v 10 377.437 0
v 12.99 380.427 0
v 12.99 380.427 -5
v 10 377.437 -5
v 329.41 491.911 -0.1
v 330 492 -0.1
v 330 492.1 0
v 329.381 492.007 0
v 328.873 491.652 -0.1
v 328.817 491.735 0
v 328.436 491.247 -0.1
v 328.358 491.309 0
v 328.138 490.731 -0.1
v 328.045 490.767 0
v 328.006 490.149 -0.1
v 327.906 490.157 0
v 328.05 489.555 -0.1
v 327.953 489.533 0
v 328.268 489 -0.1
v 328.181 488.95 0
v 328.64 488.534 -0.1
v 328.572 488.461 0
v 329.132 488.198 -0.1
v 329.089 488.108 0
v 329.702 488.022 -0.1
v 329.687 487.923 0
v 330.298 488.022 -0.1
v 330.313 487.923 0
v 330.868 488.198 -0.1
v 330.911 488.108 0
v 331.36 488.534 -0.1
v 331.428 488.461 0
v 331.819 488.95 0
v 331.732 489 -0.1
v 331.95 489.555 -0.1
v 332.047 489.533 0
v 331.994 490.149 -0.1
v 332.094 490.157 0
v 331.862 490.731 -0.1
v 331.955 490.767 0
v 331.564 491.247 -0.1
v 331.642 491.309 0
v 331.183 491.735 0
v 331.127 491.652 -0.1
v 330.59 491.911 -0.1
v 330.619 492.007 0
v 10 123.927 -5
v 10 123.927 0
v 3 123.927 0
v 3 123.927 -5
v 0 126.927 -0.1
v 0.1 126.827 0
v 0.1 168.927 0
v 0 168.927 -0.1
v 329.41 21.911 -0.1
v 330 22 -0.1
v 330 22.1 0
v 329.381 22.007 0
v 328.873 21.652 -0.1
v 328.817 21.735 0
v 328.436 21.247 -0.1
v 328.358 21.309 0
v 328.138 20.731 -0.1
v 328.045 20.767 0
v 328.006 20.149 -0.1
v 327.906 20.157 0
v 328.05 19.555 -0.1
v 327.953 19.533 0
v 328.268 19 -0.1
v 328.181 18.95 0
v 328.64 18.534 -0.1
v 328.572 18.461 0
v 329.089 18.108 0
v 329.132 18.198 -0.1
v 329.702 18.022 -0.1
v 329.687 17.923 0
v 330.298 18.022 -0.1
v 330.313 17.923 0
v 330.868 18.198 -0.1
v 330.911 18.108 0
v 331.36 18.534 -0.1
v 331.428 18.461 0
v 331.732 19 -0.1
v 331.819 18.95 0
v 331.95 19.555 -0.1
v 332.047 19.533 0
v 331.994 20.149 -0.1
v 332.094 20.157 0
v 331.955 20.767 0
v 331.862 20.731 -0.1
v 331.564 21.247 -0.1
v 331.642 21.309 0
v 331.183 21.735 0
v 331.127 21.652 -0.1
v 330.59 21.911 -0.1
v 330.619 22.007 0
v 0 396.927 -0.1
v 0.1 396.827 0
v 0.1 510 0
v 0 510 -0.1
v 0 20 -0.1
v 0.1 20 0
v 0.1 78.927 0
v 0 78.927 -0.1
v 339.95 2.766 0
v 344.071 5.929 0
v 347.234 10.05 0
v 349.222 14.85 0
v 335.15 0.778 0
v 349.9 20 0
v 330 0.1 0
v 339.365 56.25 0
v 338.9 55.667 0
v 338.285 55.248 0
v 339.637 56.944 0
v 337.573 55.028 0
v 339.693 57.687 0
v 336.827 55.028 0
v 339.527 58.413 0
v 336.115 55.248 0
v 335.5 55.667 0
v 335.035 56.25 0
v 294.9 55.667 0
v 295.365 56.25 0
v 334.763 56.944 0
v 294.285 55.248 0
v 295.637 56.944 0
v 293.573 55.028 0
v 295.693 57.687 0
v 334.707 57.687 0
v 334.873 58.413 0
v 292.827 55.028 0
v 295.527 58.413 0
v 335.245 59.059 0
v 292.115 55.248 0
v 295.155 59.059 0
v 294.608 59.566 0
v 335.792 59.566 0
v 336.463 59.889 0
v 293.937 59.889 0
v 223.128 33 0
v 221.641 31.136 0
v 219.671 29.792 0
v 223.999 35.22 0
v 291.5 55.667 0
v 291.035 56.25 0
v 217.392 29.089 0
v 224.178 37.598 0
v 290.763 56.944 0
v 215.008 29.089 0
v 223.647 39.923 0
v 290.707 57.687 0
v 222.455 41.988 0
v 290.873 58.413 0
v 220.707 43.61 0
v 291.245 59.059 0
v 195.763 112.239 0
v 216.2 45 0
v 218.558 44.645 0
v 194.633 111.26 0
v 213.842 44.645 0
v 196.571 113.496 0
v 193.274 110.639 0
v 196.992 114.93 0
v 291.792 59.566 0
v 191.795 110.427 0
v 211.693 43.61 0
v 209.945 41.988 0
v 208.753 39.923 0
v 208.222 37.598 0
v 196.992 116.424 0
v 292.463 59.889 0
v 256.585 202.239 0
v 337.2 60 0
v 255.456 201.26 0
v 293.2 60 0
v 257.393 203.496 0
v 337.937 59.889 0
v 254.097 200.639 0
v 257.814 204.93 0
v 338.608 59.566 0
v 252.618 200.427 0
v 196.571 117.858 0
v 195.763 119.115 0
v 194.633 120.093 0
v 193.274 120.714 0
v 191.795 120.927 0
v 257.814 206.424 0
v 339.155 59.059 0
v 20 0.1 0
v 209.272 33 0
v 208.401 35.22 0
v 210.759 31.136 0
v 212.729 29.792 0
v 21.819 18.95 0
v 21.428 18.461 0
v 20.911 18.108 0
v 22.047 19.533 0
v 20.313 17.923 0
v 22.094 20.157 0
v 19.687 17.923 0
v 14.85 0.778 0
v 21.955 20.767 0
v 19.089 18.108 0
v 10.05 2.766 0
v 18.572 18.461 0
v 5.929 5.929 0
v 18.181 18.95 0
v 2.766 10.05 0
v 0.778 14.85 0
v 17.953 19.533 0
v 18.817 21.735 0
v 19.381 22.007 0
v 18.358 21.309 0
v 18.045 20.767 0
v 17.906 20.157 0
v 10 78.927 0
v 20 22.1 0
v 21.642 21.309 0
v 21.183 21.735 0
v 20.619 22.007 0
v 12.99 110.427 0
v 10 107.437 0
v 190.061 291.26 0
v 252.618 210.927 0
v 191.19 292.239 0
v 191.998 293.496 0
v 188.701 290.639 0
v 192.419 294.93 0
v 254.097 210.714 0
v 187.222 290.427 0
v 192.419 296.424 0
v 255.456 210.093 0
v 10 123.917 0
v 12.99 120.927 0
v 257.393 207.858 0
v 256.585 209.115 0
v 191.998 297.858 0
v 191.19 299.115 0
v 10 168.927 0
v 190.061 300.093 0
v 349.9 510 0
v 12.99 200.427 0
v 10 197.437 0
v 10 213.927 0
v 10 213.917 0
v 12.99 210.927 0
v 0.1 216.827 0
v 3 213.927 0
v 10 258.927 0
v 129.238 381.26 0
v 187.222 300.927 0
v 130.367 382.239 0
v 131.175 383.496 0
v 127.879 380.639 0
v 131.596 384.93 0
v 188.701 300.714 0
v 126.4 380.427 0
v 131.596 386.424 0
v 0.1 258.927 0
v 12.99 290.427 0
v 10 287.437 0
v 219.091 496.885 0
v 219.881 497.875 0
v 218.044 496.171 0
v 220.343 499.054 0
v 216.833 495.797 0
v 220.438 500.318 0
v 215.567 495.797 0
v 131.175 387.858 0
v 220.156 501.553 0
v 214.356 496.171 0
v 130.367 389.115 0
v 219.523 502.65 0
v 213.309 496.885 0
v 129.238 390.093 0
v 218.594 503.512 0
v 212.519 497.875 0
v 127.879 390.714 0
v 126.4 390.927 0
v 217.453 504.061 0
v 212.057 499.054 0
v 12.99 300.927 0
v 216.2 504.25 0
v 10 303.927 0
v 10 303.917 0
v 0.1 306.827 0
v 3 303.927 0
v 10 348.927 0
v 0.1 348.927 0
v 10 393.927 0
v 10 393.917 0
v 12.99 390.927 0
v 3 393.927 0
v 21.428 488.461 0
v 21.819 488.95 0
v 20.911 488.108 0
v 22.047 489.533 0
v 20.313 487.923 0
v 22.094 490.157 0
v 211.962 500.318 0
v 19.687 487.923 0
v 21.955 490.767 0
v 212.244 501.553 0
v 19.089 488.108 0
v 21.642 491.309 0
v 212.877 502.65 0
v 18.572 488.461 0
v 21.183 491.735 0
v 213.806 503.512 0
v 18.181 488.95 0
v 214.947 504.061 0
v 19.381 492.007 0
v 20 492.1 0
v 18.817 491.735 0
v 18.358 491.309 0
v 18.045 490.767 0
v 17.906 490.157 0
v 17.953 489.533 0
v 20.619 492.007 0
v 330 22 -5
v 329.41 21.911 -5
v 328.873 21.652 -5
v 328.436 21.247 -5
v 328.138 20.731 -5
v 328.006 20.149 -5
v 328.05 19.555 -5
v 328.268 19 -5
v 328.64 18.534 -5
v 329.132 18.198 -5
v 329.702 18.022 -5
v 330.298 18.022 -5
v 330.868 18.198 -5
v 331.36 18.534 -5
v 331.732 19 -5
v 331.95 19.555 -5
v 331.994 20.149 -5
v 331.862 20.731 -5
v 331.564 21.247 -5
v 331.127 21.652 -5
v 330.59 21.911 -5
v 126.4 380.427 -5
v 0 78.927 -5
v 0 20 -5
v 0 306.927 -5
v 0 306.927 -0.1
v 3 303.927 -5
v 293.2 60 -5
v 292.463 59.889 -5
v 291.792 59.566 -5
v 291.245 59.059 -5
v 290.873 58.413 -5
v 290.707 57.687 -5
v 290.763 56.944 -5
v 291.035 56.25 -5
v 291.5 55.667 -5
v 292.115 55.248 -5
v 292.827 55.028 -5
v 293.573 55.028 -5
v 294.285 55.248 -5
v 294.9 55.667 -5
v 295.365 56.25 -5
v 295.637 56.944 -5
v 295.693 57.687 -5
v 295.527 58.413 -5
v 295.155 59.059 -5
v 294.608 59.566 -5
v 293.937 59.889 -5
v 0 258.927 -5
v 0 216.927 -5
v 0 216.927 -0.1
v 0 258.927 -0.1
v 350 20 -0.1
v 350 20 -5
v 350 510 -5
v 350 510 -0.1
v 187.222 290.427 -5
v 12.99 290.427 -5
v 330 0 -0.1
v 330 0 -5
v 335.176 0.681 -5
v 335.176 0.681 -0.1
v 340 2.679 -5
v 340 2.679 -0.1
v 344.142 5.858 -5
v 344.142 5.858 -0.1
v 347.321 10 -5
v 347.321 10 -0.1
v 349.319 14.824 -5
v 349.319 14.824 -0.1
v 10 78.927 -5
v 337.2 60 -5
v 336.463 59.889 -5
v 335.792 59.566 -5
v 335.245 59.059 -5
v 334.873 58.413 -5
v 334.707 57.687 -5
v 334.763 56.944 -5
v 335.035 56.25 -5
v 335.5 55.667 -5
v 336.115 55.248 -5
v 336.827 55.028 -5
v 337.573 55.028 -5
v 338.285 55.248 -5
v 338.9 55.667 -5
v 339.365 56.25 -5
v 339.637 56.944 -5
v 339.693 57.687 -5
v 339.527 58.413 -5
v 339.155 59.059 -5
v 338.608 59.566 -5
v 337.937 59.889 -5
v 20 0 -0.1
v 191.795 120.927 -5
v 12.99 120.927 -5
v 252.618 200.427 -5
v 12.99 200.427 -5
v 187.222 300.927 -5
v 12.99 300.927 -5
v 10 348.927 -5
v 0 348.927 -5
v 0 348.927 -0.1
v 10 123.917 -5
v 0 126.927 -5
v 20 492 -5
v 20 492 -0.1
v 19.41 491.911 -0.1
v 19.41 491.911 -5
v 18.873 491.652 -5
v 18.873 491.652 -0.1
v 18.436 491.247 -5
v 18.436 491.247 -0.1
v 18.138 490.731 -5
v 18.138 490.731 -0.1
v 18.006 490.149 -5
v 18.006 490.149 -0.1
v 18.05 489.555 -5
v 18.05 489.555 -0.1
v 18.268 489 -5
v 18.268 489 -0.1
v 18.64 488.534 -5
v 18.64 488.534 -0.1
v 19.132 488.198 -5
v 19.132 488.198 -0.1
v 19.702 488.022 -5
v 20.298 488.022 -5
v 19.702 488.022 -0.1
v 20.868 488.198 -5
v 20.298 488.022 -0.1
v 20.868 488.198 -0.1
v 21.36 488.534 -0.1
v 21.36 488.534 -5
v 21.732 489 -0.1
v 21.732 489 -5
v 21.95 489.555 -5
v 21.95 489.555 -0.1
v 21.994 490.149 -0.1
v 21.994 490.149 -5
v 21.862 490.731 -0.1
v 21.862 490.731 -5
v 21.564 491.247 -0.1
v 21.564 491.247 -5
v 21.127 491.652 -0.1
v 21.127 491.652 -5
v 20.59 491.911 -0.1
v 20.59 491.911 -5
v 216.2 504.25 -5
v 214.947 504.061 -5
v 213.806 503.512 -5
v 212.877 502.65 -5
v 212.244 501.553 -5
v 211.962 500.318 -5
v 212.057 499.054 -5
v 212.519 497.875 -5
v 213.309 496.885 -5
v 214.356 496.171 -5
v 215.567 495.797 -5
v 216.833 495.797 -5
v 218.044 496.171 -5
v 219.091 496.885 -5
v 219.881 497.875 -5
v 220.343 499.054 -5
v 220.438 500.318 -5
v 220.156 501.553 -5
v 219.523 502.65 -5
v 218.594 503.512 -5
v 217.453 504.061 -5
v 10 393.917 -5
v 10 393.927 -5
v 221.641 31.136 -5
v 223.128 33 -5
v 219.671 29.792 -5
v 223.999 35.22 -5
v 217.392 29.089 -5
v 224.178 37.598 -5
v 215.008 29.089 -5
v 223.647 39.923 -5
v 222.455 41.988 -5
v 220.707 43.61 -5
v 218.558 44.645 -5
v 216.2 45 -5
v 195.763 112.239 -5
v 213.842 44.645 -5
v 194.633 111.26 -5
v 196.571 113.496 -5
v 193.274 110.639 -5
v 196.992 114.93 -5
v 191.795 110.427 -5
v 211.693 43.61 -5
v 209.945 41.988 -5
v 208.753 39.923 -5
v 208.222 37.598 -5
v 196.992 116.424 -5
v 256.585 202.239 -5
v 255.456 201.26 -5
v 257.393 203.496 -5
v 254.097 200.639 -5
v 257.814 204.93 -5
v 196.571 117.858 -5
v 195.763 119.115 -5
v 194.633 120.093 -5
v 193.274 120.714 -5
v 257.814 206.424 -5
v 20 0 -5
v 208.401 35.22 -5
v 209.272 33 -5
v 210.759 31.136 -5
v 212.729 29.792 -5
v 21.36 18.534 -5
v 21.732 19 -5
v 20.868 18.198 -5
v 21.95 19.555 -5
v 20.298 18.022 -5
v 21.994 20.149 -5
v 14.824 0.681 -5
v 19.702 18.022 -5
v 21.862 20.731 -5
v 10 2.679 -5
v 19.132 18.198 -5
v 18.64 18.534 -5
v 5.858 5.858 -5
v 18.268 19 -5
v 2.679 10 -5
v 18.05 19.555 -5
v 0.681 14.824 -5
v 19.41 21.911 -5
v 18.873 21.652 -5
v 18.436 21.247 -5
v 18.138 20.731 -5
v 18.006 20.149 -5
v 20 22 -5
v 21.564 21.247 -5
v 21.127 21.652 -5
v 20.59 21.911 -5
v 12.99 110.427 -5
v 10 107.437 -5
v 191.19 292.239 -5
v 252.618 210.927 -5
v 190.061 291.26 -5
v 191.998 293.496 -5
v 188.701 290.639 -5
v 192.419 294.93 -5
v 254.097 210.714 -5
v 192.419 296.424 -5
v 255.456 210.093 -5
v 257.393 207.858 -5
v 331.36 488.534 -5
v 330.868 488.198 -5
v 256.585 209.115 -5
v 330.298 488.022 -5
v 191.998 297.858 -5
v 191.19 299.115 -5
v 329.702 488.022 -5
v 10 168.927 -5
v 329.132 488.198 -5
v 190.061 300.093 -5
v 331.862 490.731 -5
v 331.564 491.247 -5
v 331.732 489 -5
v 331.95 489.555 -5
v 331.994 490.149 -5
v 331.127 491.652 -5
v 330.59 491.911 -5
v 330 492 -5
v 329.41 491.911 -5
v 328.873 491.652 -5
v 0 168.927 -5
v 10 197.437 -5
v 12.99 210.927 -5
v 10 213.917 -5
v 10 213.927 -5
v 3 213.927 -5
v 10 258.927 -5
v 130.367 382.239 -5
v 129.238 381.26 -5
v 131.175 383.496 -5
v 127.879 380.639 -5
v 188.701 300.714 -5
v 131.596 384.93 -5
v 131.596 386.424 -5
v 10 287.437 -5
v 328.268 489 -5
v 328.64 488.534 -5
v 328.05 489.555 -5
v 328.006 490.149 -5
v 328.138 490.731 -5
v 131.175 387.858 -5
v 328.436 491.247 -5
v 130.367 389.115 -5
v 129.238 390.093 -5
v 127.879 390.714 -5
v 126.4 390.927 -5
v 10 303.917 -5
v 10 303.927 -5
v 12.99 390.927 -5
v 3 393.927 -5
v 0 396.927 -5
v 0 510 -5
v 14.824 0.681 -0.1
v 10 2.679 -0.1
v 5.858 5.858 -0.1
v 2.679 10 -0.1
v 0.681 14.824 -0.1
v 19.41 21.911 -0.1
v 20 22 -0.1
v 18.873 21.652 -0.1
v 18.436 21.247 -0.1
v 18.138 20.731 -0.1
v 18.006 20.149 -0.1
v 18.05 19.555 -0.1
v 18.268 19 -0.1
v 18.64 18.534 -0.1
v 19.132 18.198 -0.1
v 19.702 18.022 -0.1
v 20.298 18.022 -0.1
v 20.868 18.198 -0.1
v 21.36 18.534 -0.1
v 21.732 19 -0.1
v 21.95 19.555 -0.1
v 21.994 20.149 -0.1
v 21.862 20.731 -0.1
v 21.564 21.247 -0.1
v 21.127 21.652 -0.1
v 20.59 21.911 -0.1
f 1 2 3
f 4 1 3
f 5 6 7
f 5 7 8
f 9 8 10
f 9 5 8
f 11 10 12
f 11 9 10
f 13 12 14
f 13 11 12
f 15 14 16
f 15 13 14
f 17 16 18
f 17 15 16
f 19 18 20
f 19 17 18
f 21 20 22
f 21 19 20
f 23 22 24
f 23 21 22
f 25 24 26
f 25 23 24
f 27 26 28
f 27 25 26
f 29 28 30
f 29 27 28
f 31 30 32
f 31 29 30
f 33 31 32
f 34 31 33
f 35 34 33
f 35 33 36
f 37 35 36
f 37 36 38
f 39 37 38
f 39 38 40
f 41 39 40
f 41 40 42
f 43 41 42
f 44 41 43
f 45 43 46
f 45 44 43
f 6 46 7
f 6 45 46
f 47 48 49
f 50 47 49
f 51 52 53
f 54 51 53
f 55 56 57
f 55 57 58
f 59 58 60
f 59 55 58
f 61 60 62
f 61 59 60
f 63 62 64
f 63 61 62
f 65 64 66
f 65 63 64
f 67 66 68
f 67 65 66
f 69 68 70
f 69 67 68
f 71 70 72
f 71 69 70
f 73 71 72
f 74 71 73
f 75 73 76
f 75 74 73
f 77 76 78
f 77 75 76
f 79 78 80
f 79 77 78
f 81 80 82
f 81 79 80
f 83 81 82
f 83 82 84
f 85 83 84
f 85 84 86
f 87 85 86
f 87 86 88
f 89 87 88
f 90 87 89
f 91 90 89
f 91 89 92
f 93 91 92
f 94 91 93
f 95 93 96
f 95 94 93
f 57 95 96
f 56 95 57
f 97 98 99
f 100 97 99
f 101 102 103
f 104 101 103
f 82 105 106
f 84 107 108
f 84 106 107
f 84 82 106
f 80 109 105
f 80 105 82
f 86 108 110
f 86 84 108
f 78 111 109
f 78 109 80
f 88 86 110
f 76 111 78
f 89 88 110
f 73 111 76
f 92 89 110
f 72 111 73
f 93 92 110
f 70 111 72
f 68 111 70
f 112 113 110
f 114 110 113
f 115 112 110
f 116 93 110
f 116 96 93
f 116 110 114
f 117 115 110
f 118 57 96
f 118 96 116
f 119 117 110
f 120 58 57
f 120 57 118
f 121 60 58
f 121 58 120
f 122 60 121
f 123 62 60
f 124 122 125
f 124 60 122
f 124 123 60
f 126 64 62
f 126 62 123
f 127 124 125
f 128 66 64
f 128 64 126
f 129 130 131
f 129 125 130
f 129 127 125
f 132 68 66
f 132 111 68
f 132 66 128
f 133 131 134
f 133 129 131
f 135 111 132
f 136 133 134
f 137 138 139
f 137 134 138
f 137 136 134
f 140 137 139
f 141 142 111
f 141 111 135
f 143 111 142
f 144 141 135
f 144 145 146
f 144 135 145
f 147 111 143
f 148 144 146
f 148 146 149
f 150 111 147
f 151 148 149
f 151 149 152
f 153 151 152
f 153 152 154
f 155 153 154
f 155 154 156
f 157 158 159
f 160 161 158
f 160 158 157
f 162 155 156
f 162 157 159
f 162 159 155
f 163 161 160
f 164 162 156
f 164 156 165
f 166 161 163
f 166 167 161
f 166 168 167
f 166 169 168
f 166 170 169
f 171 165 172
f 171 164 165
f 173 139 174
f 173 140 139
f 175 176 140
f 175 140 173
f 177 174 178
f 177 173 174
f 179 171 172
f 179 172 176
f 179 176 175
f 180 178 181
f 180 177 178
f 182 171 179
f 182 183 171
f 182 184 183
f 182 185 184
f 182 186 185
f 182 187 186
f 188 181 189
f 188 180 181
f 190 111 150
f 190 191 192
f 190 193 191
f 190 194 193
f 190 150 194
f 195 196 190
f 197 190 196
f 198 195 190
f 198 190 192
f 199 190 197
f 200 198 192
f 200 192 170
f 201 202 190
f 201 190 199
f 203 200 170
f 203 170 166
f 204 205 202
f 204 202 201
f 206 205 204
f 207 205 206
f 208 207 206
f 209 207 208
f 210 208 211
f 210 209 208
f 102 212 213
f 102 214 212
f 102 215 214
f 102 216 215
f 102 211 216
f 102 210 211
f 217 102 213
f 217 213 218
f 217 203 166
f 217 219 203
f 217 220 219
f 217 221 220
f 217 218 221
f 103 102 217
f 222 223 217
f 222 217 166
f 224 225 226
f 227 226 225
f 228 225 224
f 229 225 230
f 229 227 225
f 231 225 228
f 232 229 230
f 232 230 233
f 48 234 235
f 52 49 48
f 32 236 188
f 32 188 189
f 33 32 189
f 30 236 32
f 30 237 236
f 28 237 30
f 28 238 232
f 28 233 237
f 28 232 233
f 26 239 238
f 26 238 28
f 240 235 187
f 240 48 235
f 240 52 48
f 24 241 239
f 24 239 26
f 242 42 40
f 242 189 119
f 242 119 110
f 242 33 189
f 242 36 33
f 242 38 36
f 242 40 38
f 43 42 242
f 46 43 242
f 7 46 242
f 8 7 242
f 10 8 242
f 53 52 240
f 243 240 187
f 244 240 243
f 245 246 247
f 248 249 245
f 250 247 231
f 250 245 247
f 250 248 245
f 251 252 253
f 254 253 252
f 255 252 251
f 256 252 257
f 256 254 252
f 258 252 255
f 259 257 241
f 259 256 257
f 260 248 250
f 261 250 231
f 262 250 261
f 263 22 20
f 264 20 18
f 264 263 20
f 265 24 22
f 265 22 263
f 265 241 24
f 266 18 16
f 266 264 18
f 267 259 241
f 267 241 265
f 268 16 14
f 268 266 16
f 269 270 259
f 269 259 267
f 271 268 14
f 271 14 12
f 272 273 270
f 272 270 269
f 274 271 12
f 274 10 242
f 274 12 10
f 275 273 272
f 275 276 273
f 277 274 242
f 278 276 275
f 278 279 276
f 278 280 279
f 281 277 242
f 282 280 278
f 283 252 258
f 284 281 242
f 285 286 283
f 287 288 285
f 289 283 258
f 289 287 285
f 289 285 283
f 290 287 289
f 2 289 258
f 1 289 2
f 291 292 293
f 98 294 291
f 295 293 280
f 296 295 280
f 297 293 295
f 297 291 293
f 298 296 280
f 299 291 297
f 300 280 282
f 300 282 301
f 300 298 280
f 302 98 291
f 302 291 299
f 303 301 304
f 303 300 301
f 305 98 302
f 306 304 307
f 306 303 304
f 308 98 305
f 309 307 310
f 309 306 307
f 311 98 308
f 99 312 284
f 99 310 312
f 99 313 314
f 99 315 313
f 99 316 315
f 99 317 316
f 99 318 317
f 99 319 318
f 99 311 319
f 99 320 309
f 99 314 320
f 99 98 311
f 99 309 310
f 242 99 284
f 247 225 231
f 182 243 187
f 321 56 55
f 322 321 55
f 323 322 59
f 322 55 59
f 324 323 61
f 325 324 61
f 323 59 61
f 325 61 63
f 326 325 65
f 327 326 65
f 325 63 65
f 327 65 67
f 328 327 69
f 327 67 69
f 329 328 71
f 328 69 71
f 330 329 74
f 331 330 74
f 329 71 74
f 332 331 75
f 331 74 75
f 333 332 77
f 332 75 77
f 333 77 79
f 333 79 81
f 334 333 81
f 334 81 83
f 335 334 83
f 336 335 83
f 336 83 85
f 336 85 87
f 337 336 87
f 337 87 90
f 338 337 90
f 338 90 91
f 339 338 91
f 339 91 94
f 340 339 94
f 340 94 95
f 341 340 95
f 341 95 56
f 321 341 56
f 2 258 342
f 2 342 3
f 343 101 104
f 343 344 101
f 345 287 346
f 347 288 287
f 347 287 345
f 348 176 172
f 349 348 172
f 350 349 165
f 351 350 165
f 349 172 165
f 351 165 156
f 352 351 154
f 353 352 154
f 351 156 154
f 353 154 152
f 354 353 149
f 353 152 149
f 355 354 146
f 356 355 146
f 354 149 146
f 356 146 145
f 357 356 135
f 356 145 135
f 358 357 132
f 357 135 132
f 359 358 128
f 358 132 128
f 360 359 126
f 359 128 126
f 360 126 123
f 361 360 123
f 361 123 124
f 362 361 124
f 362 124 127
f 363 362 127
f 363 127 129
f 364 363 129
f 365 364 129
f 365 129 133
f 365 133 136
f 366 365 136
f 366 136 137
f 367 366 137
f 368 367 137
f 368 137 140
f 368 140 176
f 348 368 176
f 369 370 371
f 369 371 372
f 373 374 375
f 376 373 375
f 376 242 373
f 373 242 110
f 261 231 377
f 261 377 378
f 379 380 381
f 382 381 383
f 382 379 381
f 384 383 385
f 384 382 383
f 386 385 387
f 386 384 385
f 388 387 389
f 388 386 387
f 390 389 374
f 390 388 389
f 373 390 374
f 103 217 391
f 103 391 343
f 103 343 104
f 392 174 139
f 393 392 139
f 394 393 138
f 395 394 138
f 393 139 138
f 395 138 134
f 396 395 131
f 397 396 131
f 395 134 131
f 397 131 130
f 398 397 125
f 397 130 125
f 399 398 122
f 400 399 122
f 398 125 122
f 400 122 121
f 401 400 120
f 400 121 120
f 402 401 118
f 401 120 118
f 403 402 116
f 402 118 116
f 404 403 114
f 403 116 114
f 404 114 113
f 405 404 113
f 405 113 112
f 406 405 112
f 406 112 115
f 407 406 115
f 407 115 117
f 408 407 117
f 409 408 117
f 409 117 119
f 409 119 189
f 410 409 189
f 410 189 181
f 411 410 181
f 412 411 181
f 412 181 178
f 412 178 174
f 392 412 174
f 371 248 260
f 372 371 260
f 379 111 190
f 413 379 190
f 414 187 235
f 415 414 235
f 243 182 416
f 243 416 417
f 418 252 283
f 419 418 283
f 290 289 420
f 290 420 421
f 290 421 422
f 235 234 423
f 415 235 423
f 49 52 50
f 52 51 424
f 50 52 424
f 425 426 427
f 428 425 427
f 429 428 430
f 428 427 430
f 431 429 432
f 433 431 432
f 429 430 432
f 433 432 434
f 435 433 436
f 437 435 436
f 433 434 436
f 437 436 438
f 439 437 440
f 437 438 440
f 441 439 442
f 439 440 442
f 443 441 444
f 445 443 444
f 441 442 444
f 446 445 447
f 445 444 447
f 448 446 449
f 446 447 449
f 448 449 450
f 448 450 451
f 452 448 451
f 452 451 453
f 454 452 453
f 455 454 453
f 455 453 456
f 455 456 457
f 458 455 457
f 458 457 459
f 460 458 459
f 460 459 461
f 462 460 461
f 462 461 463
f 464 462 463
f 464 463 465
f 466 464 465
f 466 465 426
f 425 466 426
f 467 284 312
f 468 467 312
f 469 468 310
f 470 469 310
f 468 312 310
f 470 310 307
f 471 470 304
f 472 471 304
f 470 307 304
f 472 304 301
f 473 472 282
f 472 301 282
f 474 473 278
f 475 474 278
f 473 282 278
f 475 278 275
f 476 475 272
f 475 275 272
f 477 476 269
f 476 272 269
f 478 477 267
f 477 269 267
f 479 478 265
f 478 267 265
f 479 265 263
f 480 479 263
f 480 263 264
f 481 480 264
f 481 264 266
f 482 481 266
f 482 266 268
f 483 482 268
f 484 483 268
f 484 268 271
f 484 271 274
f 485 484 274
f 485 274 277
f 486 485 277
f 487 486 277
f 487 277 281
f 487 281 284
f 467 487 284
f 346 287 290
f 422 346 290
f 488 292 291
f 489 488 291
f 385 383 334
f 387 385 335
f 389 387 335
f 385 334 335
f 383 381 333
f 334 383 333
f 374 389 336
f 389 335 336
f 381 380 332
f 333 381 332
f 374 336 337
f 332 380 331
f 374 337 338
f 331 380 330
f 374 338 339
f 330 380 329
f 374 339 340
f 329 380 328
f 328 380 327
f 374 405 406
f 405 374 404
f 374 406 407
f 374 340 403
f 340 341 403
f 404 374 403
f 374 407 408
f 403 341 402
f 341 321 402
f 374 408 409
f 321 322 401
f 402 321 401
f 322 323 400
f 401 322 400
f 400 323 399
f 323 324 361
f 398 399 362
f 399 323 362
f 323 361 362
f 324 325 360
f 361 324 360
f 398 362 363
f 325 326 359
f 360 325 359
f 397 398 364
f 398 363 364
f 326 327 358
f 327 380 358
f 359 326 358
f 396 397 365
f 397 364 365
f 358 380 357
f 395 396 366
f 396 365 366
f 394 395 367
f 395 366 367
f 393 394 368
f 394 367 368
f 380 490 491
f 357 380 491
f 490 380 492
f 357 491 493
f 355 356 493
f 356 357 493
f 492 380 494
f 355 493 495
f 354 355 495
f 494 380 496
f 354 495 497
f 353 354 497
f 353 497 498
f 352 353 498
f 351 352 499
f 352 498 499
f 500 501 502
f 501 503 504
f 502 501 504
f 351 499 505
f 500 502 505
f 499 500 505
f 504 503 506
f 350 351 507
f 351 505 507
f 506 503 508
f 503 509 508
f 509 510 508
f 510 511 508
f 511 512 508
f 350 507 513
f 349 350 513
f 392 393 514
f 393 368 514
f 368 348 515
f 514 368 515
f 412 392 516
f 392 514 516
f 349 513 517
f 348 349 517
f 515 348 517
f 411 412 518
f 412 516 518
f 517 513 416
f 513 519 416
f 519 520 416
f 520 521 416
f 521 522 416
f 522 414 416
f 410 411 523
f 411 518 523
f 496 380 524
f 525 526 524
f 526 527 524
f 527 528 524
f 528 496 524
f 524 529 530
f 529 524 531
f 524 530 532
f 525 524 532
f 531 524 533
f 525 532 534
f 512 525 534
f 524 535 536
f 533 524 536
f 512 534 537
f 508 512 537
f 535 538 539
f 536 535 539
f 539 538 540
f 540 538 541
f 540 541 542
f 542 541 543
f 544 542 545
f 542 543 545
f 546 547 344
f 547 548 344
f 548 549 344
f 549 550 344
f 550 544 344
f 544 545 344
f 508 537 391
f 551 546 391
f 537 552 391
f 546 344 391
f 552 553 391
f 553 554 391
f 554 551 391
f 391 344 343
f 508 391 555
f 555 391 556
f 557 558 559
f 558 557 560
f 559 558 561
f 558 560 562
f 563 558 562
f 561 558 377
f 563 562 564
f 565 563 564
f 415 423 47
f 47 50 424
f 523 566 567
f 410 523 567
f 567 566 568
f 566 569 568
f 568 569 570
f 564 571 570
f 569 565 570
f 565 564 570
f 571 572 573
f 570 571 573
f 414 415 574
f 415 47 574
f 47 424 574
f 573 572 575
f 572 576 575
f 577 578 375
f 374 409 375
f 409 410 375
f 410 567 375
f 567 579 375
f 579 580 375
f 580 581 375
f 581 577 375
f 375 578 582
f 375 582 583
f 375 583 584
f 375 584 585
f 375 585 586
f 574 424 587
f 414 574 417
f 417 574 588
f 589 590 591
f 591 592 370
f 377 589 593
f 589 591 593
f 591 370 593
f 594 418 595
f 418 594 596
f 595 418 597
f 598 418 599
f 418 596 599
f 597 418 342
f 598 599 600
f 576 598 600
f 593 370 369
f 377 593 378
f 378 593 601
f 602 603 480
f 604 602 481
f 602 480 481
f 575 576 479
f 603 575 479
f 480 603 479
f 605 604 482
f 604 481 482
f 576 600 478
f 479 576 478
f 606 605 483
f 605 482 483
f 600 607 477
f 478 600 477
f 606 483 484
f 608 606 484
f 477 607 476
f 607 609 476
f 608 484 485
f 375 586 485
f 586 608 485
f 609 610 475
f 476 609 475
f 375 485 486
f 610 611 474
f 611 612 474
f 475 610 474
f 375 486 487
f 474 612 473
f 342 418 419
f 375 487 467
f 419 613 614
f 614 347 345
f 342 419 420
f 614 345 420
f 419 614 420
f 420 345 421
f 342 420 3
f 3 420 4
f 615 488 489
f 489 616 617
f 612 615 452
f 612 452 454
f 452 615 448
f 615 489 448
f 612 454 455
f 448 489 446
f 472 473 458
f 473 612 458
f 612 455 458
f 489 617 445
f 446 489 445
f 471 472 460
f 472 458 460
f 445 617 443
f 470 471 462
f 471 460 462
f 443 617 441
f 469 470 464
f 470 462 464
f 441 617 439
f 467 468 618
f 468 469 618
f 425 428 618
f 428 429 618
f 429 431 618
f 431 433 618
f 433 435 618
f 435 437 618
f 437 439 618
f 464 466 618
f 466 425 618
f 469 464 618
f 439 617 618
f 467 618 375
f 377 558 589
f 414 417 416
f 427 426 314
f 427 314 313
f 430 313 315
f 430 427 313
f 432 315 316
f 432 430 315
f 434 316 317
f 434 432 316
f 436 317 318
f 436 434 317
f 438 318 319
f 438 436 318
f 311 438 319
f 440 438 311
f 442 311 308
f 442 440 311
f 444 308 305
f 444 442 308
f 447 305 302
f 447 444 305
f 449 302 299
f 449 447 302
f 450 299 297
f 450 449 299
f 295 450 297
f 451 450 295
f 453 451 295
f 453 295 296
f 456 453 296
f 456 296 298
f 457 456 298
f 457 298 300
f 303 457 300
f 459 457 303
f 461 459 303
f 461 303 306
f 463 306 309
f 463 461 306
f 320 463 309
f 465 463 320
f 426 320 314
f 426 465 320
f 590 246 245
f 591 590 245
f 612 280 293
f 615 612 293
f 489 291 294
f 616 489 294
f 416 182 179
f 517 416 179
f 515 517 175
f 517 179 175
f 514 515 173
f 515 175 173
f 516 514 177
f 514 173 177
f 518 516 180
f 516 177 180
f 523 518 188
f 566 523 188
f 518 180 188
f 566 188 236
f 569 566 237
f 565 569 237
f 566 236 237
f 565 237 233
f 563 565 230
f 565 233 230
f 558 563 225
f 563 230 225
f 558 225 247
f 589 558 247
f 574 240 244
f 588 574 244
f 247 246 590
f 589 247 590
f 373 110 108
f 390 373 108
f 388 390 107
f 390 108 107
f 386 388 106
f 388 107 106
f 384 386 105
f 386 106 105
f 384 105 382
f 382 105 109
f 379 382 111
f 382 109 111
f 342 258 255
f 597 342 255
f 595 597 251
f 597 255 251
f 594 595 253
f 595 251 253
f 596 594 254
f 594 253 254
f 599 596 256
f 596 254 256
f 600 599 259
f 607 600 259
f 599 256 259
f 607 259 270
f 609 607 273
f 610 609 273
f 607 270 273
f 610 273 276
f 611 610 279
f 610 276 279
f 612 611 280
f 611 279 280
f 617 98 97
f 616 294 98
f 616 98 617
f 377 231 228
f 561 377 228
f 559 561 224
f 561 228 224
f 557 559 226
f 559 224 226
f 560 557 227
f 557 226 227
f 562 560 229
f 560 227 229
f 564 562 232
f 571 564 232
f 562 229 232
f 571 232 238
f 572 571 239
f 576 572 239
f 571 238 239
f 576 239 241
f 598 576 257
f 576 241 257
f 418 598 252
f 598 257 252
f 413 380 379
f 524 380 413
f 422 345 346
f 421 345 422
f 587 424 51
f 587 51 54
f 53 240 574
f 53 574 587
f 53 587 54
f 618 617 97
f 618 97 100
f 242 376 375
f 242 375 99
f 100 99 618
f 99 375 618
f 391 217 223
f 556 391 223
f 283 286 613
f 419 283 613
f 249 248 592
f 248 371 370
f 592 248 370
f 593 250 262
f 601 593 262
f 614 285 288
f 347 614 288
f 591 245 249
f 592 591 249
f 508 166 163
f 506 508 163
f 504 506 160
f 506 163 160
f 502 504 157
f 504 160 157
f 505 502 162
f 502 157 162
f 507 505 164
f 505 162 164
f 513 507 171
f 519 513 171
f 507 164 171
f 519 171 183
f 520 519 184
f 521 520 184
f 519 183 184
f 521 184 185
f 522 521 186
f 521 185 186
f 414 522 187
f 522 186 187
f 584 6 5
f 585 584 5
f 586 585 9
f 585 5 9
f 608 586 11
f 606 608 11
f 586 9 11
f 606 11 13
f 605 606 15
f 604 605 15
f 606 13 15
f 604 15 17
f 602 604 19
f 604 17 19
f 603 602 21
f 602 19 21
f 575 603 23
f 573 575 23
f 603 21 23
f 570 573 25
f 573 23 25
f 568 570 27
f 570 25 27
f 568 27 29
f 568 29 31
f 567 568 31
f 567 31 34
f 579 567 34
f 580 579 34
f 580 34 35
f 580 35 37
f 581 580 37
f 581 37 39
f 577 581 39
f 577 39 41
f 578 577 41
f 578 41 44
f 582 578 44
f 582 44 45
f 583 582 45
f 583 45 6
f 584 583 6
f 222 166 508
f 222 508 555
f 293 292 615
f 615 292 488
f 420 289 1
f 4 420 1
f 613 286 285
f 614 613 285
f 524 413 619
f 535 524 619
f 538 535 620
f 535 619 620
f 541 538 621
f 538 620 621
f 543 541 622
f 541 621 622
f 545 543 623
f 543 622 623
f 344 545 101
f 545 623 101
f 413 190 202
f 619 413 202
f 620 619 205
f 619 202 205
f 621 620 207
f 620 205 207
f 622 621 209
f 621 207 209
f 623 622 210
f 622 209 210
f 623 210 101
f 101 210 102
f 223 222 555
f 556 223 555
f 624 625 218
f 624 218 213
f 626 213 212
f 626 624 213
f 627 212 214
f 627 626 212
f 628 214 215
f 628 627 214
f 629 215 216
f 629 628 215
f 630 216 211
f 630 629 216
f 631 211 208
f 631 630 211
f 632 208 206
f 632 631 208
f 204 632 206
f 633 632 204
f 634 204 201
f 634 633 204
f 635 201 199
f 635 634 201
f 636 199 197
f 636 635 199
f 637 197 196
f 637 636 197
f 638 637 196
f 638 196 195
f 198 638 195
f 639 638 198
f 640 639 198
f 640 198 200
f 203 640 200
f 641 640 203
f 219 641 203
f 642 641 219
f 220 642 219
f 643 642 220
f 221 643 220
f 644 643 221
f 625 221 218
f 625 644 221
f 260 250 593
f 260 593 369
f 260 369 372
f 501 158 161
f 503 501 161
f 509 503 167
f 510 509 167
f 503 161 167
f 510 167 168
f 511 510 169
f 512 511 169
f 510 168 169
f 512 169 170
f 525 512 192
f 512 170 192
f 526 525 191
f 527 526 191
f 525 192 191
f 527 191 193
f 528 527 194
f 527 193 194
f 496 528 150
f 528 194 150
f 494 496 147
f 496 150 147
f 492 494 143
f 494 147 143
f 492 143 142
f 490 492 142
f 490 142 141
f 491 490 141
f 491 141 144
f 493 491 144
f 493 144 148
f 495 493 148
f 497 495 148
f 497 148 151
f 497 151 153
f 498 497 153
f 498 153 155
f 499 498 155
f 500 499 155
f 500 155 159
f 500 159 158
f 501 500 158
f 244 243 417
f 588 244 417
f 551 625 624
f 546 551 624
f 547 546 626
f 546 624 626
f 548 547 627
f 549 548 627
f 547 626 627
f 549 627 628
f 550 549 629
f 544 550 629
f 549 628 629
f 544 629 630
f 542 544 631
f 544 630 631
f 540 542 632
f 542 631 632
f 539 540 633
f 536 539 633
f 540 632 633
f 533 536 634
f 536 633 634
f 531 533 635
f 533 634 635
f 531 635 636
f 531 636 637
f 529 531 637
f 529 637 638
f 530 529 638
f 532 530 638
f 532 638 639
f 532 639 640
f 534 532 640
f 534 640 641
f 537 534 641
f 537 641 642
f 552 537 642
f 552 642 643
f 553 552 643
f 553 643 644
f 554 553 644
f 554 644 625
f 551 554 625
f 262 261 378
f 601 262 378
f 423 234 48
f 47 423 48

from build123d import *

# Parameters (mm, degrees)
SKETCH018_W           = 510
SKETCH018_H           = 350
PAD015_DEPTH          = 5
SKETCH019_R           = 8
SKETCH019_R_2         = 4.25
POCKET011_DEPTH       = 5.001
FILLET005_R           = 20
SKETCH020_R           = 2
POCKET012_DEPTH       = 5.001
CHAMFER009_SIZE       = 6
CHAMFER010_SIZE       = 0.1
CHAMFER011_SIZE       = 0.1
SKETCH052_W           = 45
SKETCH052_H           = 10
POCKET033_DEPTH       = 5.001
CHAMFER024_SIZE       = 2.99
SKETCH068_R           = 2.5
POCKET043_DEPTH       = 5.001
CLONE_PLACEMENT_ANGLE = 90


with BuildPart() as part:
    # Sketch018 → Pad015 (new body)
    with BuildSketch(Plane.XY):
        with Locations((-20, 41.2)):
            Rectangle(SKETCH018_W, SKETCH018_H)
    extrude(amount=PAD015_DEPTH)

    # Sketch019 (on Face6 of Pad015) → Pocket011 (cut, through all)
    with BuildSketch(Plane.XY.offset(5)):
        with Locations((-238, 0)):
            Circle(SKETCH019_R)
        with Locations((225, 0)):
            Circle(SKETCH019_R_2)
        with BuildLine():
            ThreePointArc((-164.573184, 24.404903), (-159.323184, 19.154903), (-154.073184, 24.404903))
            Line((-154.073184, 24.404903), (-154.073184, 216.2))
            ThreePointArc((-154.073184, 216.2), (-159.323184, 221.45), (-164.573184, 216.2))
            Line((-164.573184, 24.404903), (-164.573184, 216.2))
        make_face()
        with BuildLine():
            ThreePointArc((-74.573184, -36.417713), (-69.323184, -41.667713), (-64.073184, -36.417713))
            Line((-64.073184, -36.417713), (-64.073184, 216.2))
            ThreePointArc((-64.073184, 216.2), (-69.323184, 221.45), (-74.573184, 216.2))
            Line((-74.573184, -36.417713), (-74.573184, 216.2))
        make_face()
        with BuildLine():
            ThreePointArc((15.426816, 28.977719), (20.676816, 23.727719), (25.926816, 28.977719))
            Line((25.926816, 28.977719), (25.926816, 216.2))
            ThreePointArc((25.926816, 216.2), (20.676816, 221.45), (15.426816, 216.2))
            Line((15.426816, 28.977719), (15.426816, 216.2))
        make_face()
        with BuildLine():
            ThreePointArc((105.426816, 89.800335), (110.676816, 84.550335), (115.926816, 89.800335))
            Line((115.926816, 89.800335), (115.926816, 216.2))
            ThreePointArc((115.926816, 216.2), (110.676816, 221.45), (105.426816, 216.2))
            Line((105.426816, 89.800335), (105.426816, 216.2))
        make_face()
    extrude(amount=-POCKET011_DEPTH, mode=Mode.SUBTRACT)

    # Fillet005
    fillet005_edges = [part.edges().sort_by_distance(p)[0] for p in [
        (-275, 216.2, 2.5),
        (-275, -133.8, 2.5),
    ]]
    fillet(fillet005_edges, radius=FILLET005_R)

    # Sketch020 (on Face5 of Fillet005) → Pocket012 (cut, through all)
    with BuildSketch(Plane.XY.offset(5)):
        with Locations((-255, 196.2)):
            Circle(SKETCH020_R)
        with Locations((-255, -113.8)):
            Circle(SKETCH020_R)
        with Locations((215, -113.8)):
            Circle(SKETCH020_R)
        with Locations((215, 196.2)):
            Circle(SKETCH020_R)
    extrude(amount=-POCKET012_DEPTH, mode=Mode.SUBTRACT)

    # Chamfer009
    chamfer009_edges = [part.edges().sort_by_distance(p)[0] for p in [
        (-164.573184, 216.2, 2.5),
        (-154.073184, 216.2, 2.5),
        (-74.573184, 216.2, 2.5),
        (-64.073184, 216.2, 2.5),
        (15.426816, 216.2, 2.5),
        (25.926816, 216.2, 2.5),
        (105.426816, 216.2, 2.5),
        (115.926816, 216.2, 2.5),
    ]]
    chamfer(chamfer009_edges, length=CHAMFER009_SIZE)

    # Chamfer010
    chamfer010_edges = [part.edges().sort_by_distance(p)[0] for p in [
        (-212.786592, 216.2, 5),
        (-114.323184, 216.2, 5),
        (-24.323184, 216.2, 5),
        (65.676816, 216.2, 5),
        (178.463408, 216.2, 5),
    ]]
    chamfer(chamfer010_edges, length=CHAMFER010_SIZE)

    # Chamfer011
    chamfer011_edges = [part.edges().sort_by_distance(p)[0] for p in [
        (-257, 196.2, 5),
        (-257, -113.8, 5),
        (213, -113.8, 5),
        (213, 196.2, 5),
    ]]
    chamfer(chamfer011_edges, length=CHAMFER011_SIZE)

    # Sketch052 (on Face1 of Chamfer011) → Pocket033 (cut, through all)
    with BuildSketch(Plane.XY.offset(5)):
        with Locations((-173.573184, 211.2)):
            Rectangle(SKETCH052_W, SKETCH052_H)
        with Locations((-83.573184, 211.2)):
            Rectangle(SKETCH052_W, SKETCH052_H)
        with Locations((6.426816, 211.2)):
            Rectangle(SKETCH052_W, SKETCH052_H)
        with Locations((96.426816, 211.2)):
            Rectangle(SKETCH052_W, SKETCH052_H)
    extrude(amount=-POCKET033_DEPTH, mode=Mode.SUBTRACT)

    # Chamfer024
    chamfer024_edges = [part.edges().sort_by_distance(p)[0] for p in [
        (-164.573184, 206.2, 2.5),
        (-154.073184, 206.2, 2.5),
        (-74.573184, 206.2, 2.5),
        (-64.073184, 206.2, 2.5),
        (15.426816, 206.2, 2.5),
        (25.926816, 206.2, 2.5),
        (105.426816, 206.2, 2.5),
        (115.926816, 206.2, 2.5),
    ]]
    chamfer(chamfer024_edges, length=CHAMFER024_SIZE)

    # Sketch068 (on Face1 of Chamfer024) → Pocket043 (cut, through all)
    with BuildSketch(Plane.XY.offset(5)):
        with Locations((-217.5, -77)):
            Circle(SKETCH068_R)
        with Locations((-217.5, -121)):
            Circle(SKETCH068_R)
    extrude(amount=-POCKET043_DEPTH, mode=Mode.SUBTRACT)


with BuildPart() as part_1:
    # Body011 placement: moved
    add(part.part.moved(Location((0, 0, 10.25))))


with BuildPart() as part_2:
    # Clone placement: moved
    add(part_1.part.moved(Location((216.2, 275, -15.25))).rotate(Axis((216.2, 275, -15.25), (0, 0, 1)), CLONE_PLACEMENT_ANGLE))


solid = part_2.part
